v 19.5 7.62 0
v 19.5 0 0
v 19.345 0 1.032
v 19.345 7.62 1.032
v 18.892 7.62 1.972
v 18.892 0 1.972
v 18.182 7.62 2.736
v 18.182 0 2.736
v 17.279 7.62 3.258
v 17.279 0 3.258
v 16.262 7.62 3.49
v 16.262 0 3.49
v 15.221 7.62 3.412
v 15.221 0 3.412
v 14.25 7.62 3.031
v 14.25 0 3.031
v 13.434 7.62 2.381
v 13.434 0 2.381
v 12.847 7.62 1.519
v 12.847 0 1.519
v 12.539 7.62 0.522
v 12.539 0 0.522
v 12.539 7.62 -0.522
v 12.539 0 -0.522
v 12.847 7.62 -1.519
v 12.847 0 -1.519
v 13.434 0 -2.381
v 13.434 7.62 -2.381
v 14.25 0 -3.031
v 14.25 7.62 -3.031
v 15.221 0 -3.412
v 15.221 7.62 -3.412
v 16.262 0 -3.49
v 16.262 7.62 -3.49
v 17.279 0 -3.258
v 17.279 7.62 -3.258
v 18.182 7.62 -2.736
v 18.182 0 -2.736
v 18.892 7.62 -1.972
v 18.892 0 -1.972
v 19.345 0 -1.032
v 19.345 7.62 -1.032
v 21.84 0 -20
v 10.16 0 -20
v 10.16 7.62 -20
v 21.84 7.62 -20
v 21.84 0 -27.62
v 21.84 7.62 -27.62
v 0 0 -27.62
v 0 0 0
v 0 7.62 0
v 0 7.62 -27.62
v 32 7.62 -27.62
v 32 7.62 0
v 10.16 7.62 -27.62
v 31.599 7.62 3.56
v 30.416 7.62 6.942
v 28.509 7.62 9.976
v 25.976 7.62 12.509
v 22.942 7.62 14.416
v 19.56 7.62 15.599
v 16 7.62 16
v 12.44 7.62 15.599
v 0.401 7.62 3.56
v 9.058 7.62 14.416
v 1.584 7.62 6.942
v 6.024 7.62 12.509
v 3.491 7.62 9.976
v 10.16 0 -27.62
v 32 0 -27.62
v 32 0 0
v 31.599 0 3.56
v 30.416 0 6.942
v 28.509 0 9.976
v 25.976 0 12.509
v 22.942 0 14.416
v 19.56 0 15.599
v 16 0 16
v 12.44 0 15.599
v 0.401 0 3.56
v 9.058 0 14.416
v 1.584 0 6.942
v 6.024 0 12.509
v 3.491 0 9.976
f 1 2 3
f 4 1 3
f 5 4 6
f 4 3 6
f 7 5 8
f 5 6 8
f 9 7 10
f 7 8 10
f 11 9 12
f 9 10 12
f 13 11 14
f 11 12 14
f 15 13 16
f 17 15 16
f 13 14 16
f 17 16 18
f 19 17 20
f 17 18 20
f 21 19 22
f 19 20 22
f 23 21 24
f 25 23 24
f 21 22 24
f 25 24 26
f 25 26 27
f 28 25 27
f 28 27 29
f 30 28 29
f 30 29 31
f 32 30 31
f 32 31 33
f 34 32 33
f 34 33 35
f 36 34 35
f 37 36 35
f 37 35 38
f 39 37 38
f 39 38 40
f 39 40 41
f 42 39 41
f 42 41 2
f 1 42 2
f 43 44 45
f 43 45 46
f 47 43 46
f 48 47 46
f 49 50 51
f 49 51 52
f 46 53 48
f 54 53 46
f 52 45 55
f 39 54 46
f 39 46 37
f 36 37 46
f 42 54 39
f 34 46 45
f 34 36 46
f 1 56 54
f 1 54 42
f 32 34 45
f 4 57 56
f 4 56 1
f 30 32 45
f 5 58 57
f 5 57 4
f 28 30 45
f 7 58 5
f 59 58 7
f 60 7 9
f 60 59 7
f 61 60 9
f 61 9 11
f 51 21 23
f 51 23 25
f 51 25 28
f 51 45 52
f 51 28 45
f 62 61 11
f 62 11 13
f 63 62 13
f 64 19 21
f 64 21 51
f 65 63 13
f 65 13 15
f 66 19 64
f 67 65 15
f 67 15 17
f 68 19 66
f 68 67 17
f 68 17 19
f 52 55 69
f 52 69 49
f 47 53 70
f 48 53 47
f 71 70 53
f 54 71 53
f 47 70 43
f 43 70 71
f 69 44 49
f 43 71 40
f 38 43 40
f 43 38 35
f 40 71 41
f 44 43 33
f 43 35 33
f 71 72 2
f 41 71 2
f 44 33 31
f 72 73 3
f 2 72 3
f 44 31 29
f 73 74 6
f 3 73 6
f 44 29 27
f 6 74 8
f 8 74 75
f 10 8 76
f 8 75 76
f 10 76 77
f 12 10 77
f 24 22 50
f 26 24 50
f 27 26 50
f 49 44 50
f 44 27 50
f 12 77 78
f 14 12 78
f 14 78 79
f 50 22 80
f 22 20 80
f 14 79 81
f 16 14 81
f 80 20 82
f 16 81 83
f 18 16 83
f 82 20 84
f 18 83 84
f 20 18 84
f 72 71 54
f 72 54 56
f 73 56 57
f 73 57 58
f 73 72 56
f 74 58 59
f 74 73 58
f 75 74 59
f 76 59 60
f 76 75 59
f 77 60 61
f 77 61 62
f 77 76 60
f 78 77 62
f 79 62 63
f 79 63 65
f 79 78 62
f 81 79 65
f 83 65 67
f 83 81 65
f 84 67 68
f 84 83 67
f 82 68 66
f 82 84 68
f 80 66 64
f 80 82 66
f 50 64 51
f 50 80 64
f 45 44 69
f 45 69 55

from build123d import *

# Parameters (mm, degrees)
BOSS_EXTRUDE1_DEPTH = 7.62
SKETCH2_R           = 3.5
CUT_EXTRUDE1_DEPTH  = 8.62
SKETCH3_W           = 10.16
SKETCH3_H           = 7.62
BOSS_EXTRUDE2_DEPTH = 7.62


with BuildPart() as part:
    # Sketch1 → Boss-Extrude1 (new body)
    with BuildSketch(Plane(origin=(0, 0, 0), x_dir=(1, 0, 0), z_dir=(0, 1, 0))):
        with BuildLine():
            Line((0, 0), (0, 20))
            Line((0, 20), (32, 20))
            Line((32, 20), (32, 0))
            ThreePointArc((32, 0), (16, -16), (0, 0))
        make_face()
    extrude(amount=BOSS_EXTRUDE1_DEPTH)

    # Sketch2 → Cut-Extrude1 (cut, through all)
    with BuildSketch(Plane.XZ):
        with Locations((16, 0)):
            Circle(SKETCH2_R)
    extrude(amount=-CUT_EXTRUDE1_DEPTH, mode=Mode.SUBTRACT)

    # Sketch3 → Boss-Extrude2 (add)
    with BuildSketch(Plane(origin=(0, 0, -20), x_dir=(-1, 0, 0), z_dir=(0, 0, -1))):
        with Locations((-26.92, 3.81)):
            Rectangle(SKETCH3_W, SKETCH3_H)
        with Locations((-5.08, 3.81)):
            Rectangle(SKETCH3_W, SKETCH3_H)
    extrude(amount=BOSS_EXTRUDE2_DEPTH)


solid = part.part
